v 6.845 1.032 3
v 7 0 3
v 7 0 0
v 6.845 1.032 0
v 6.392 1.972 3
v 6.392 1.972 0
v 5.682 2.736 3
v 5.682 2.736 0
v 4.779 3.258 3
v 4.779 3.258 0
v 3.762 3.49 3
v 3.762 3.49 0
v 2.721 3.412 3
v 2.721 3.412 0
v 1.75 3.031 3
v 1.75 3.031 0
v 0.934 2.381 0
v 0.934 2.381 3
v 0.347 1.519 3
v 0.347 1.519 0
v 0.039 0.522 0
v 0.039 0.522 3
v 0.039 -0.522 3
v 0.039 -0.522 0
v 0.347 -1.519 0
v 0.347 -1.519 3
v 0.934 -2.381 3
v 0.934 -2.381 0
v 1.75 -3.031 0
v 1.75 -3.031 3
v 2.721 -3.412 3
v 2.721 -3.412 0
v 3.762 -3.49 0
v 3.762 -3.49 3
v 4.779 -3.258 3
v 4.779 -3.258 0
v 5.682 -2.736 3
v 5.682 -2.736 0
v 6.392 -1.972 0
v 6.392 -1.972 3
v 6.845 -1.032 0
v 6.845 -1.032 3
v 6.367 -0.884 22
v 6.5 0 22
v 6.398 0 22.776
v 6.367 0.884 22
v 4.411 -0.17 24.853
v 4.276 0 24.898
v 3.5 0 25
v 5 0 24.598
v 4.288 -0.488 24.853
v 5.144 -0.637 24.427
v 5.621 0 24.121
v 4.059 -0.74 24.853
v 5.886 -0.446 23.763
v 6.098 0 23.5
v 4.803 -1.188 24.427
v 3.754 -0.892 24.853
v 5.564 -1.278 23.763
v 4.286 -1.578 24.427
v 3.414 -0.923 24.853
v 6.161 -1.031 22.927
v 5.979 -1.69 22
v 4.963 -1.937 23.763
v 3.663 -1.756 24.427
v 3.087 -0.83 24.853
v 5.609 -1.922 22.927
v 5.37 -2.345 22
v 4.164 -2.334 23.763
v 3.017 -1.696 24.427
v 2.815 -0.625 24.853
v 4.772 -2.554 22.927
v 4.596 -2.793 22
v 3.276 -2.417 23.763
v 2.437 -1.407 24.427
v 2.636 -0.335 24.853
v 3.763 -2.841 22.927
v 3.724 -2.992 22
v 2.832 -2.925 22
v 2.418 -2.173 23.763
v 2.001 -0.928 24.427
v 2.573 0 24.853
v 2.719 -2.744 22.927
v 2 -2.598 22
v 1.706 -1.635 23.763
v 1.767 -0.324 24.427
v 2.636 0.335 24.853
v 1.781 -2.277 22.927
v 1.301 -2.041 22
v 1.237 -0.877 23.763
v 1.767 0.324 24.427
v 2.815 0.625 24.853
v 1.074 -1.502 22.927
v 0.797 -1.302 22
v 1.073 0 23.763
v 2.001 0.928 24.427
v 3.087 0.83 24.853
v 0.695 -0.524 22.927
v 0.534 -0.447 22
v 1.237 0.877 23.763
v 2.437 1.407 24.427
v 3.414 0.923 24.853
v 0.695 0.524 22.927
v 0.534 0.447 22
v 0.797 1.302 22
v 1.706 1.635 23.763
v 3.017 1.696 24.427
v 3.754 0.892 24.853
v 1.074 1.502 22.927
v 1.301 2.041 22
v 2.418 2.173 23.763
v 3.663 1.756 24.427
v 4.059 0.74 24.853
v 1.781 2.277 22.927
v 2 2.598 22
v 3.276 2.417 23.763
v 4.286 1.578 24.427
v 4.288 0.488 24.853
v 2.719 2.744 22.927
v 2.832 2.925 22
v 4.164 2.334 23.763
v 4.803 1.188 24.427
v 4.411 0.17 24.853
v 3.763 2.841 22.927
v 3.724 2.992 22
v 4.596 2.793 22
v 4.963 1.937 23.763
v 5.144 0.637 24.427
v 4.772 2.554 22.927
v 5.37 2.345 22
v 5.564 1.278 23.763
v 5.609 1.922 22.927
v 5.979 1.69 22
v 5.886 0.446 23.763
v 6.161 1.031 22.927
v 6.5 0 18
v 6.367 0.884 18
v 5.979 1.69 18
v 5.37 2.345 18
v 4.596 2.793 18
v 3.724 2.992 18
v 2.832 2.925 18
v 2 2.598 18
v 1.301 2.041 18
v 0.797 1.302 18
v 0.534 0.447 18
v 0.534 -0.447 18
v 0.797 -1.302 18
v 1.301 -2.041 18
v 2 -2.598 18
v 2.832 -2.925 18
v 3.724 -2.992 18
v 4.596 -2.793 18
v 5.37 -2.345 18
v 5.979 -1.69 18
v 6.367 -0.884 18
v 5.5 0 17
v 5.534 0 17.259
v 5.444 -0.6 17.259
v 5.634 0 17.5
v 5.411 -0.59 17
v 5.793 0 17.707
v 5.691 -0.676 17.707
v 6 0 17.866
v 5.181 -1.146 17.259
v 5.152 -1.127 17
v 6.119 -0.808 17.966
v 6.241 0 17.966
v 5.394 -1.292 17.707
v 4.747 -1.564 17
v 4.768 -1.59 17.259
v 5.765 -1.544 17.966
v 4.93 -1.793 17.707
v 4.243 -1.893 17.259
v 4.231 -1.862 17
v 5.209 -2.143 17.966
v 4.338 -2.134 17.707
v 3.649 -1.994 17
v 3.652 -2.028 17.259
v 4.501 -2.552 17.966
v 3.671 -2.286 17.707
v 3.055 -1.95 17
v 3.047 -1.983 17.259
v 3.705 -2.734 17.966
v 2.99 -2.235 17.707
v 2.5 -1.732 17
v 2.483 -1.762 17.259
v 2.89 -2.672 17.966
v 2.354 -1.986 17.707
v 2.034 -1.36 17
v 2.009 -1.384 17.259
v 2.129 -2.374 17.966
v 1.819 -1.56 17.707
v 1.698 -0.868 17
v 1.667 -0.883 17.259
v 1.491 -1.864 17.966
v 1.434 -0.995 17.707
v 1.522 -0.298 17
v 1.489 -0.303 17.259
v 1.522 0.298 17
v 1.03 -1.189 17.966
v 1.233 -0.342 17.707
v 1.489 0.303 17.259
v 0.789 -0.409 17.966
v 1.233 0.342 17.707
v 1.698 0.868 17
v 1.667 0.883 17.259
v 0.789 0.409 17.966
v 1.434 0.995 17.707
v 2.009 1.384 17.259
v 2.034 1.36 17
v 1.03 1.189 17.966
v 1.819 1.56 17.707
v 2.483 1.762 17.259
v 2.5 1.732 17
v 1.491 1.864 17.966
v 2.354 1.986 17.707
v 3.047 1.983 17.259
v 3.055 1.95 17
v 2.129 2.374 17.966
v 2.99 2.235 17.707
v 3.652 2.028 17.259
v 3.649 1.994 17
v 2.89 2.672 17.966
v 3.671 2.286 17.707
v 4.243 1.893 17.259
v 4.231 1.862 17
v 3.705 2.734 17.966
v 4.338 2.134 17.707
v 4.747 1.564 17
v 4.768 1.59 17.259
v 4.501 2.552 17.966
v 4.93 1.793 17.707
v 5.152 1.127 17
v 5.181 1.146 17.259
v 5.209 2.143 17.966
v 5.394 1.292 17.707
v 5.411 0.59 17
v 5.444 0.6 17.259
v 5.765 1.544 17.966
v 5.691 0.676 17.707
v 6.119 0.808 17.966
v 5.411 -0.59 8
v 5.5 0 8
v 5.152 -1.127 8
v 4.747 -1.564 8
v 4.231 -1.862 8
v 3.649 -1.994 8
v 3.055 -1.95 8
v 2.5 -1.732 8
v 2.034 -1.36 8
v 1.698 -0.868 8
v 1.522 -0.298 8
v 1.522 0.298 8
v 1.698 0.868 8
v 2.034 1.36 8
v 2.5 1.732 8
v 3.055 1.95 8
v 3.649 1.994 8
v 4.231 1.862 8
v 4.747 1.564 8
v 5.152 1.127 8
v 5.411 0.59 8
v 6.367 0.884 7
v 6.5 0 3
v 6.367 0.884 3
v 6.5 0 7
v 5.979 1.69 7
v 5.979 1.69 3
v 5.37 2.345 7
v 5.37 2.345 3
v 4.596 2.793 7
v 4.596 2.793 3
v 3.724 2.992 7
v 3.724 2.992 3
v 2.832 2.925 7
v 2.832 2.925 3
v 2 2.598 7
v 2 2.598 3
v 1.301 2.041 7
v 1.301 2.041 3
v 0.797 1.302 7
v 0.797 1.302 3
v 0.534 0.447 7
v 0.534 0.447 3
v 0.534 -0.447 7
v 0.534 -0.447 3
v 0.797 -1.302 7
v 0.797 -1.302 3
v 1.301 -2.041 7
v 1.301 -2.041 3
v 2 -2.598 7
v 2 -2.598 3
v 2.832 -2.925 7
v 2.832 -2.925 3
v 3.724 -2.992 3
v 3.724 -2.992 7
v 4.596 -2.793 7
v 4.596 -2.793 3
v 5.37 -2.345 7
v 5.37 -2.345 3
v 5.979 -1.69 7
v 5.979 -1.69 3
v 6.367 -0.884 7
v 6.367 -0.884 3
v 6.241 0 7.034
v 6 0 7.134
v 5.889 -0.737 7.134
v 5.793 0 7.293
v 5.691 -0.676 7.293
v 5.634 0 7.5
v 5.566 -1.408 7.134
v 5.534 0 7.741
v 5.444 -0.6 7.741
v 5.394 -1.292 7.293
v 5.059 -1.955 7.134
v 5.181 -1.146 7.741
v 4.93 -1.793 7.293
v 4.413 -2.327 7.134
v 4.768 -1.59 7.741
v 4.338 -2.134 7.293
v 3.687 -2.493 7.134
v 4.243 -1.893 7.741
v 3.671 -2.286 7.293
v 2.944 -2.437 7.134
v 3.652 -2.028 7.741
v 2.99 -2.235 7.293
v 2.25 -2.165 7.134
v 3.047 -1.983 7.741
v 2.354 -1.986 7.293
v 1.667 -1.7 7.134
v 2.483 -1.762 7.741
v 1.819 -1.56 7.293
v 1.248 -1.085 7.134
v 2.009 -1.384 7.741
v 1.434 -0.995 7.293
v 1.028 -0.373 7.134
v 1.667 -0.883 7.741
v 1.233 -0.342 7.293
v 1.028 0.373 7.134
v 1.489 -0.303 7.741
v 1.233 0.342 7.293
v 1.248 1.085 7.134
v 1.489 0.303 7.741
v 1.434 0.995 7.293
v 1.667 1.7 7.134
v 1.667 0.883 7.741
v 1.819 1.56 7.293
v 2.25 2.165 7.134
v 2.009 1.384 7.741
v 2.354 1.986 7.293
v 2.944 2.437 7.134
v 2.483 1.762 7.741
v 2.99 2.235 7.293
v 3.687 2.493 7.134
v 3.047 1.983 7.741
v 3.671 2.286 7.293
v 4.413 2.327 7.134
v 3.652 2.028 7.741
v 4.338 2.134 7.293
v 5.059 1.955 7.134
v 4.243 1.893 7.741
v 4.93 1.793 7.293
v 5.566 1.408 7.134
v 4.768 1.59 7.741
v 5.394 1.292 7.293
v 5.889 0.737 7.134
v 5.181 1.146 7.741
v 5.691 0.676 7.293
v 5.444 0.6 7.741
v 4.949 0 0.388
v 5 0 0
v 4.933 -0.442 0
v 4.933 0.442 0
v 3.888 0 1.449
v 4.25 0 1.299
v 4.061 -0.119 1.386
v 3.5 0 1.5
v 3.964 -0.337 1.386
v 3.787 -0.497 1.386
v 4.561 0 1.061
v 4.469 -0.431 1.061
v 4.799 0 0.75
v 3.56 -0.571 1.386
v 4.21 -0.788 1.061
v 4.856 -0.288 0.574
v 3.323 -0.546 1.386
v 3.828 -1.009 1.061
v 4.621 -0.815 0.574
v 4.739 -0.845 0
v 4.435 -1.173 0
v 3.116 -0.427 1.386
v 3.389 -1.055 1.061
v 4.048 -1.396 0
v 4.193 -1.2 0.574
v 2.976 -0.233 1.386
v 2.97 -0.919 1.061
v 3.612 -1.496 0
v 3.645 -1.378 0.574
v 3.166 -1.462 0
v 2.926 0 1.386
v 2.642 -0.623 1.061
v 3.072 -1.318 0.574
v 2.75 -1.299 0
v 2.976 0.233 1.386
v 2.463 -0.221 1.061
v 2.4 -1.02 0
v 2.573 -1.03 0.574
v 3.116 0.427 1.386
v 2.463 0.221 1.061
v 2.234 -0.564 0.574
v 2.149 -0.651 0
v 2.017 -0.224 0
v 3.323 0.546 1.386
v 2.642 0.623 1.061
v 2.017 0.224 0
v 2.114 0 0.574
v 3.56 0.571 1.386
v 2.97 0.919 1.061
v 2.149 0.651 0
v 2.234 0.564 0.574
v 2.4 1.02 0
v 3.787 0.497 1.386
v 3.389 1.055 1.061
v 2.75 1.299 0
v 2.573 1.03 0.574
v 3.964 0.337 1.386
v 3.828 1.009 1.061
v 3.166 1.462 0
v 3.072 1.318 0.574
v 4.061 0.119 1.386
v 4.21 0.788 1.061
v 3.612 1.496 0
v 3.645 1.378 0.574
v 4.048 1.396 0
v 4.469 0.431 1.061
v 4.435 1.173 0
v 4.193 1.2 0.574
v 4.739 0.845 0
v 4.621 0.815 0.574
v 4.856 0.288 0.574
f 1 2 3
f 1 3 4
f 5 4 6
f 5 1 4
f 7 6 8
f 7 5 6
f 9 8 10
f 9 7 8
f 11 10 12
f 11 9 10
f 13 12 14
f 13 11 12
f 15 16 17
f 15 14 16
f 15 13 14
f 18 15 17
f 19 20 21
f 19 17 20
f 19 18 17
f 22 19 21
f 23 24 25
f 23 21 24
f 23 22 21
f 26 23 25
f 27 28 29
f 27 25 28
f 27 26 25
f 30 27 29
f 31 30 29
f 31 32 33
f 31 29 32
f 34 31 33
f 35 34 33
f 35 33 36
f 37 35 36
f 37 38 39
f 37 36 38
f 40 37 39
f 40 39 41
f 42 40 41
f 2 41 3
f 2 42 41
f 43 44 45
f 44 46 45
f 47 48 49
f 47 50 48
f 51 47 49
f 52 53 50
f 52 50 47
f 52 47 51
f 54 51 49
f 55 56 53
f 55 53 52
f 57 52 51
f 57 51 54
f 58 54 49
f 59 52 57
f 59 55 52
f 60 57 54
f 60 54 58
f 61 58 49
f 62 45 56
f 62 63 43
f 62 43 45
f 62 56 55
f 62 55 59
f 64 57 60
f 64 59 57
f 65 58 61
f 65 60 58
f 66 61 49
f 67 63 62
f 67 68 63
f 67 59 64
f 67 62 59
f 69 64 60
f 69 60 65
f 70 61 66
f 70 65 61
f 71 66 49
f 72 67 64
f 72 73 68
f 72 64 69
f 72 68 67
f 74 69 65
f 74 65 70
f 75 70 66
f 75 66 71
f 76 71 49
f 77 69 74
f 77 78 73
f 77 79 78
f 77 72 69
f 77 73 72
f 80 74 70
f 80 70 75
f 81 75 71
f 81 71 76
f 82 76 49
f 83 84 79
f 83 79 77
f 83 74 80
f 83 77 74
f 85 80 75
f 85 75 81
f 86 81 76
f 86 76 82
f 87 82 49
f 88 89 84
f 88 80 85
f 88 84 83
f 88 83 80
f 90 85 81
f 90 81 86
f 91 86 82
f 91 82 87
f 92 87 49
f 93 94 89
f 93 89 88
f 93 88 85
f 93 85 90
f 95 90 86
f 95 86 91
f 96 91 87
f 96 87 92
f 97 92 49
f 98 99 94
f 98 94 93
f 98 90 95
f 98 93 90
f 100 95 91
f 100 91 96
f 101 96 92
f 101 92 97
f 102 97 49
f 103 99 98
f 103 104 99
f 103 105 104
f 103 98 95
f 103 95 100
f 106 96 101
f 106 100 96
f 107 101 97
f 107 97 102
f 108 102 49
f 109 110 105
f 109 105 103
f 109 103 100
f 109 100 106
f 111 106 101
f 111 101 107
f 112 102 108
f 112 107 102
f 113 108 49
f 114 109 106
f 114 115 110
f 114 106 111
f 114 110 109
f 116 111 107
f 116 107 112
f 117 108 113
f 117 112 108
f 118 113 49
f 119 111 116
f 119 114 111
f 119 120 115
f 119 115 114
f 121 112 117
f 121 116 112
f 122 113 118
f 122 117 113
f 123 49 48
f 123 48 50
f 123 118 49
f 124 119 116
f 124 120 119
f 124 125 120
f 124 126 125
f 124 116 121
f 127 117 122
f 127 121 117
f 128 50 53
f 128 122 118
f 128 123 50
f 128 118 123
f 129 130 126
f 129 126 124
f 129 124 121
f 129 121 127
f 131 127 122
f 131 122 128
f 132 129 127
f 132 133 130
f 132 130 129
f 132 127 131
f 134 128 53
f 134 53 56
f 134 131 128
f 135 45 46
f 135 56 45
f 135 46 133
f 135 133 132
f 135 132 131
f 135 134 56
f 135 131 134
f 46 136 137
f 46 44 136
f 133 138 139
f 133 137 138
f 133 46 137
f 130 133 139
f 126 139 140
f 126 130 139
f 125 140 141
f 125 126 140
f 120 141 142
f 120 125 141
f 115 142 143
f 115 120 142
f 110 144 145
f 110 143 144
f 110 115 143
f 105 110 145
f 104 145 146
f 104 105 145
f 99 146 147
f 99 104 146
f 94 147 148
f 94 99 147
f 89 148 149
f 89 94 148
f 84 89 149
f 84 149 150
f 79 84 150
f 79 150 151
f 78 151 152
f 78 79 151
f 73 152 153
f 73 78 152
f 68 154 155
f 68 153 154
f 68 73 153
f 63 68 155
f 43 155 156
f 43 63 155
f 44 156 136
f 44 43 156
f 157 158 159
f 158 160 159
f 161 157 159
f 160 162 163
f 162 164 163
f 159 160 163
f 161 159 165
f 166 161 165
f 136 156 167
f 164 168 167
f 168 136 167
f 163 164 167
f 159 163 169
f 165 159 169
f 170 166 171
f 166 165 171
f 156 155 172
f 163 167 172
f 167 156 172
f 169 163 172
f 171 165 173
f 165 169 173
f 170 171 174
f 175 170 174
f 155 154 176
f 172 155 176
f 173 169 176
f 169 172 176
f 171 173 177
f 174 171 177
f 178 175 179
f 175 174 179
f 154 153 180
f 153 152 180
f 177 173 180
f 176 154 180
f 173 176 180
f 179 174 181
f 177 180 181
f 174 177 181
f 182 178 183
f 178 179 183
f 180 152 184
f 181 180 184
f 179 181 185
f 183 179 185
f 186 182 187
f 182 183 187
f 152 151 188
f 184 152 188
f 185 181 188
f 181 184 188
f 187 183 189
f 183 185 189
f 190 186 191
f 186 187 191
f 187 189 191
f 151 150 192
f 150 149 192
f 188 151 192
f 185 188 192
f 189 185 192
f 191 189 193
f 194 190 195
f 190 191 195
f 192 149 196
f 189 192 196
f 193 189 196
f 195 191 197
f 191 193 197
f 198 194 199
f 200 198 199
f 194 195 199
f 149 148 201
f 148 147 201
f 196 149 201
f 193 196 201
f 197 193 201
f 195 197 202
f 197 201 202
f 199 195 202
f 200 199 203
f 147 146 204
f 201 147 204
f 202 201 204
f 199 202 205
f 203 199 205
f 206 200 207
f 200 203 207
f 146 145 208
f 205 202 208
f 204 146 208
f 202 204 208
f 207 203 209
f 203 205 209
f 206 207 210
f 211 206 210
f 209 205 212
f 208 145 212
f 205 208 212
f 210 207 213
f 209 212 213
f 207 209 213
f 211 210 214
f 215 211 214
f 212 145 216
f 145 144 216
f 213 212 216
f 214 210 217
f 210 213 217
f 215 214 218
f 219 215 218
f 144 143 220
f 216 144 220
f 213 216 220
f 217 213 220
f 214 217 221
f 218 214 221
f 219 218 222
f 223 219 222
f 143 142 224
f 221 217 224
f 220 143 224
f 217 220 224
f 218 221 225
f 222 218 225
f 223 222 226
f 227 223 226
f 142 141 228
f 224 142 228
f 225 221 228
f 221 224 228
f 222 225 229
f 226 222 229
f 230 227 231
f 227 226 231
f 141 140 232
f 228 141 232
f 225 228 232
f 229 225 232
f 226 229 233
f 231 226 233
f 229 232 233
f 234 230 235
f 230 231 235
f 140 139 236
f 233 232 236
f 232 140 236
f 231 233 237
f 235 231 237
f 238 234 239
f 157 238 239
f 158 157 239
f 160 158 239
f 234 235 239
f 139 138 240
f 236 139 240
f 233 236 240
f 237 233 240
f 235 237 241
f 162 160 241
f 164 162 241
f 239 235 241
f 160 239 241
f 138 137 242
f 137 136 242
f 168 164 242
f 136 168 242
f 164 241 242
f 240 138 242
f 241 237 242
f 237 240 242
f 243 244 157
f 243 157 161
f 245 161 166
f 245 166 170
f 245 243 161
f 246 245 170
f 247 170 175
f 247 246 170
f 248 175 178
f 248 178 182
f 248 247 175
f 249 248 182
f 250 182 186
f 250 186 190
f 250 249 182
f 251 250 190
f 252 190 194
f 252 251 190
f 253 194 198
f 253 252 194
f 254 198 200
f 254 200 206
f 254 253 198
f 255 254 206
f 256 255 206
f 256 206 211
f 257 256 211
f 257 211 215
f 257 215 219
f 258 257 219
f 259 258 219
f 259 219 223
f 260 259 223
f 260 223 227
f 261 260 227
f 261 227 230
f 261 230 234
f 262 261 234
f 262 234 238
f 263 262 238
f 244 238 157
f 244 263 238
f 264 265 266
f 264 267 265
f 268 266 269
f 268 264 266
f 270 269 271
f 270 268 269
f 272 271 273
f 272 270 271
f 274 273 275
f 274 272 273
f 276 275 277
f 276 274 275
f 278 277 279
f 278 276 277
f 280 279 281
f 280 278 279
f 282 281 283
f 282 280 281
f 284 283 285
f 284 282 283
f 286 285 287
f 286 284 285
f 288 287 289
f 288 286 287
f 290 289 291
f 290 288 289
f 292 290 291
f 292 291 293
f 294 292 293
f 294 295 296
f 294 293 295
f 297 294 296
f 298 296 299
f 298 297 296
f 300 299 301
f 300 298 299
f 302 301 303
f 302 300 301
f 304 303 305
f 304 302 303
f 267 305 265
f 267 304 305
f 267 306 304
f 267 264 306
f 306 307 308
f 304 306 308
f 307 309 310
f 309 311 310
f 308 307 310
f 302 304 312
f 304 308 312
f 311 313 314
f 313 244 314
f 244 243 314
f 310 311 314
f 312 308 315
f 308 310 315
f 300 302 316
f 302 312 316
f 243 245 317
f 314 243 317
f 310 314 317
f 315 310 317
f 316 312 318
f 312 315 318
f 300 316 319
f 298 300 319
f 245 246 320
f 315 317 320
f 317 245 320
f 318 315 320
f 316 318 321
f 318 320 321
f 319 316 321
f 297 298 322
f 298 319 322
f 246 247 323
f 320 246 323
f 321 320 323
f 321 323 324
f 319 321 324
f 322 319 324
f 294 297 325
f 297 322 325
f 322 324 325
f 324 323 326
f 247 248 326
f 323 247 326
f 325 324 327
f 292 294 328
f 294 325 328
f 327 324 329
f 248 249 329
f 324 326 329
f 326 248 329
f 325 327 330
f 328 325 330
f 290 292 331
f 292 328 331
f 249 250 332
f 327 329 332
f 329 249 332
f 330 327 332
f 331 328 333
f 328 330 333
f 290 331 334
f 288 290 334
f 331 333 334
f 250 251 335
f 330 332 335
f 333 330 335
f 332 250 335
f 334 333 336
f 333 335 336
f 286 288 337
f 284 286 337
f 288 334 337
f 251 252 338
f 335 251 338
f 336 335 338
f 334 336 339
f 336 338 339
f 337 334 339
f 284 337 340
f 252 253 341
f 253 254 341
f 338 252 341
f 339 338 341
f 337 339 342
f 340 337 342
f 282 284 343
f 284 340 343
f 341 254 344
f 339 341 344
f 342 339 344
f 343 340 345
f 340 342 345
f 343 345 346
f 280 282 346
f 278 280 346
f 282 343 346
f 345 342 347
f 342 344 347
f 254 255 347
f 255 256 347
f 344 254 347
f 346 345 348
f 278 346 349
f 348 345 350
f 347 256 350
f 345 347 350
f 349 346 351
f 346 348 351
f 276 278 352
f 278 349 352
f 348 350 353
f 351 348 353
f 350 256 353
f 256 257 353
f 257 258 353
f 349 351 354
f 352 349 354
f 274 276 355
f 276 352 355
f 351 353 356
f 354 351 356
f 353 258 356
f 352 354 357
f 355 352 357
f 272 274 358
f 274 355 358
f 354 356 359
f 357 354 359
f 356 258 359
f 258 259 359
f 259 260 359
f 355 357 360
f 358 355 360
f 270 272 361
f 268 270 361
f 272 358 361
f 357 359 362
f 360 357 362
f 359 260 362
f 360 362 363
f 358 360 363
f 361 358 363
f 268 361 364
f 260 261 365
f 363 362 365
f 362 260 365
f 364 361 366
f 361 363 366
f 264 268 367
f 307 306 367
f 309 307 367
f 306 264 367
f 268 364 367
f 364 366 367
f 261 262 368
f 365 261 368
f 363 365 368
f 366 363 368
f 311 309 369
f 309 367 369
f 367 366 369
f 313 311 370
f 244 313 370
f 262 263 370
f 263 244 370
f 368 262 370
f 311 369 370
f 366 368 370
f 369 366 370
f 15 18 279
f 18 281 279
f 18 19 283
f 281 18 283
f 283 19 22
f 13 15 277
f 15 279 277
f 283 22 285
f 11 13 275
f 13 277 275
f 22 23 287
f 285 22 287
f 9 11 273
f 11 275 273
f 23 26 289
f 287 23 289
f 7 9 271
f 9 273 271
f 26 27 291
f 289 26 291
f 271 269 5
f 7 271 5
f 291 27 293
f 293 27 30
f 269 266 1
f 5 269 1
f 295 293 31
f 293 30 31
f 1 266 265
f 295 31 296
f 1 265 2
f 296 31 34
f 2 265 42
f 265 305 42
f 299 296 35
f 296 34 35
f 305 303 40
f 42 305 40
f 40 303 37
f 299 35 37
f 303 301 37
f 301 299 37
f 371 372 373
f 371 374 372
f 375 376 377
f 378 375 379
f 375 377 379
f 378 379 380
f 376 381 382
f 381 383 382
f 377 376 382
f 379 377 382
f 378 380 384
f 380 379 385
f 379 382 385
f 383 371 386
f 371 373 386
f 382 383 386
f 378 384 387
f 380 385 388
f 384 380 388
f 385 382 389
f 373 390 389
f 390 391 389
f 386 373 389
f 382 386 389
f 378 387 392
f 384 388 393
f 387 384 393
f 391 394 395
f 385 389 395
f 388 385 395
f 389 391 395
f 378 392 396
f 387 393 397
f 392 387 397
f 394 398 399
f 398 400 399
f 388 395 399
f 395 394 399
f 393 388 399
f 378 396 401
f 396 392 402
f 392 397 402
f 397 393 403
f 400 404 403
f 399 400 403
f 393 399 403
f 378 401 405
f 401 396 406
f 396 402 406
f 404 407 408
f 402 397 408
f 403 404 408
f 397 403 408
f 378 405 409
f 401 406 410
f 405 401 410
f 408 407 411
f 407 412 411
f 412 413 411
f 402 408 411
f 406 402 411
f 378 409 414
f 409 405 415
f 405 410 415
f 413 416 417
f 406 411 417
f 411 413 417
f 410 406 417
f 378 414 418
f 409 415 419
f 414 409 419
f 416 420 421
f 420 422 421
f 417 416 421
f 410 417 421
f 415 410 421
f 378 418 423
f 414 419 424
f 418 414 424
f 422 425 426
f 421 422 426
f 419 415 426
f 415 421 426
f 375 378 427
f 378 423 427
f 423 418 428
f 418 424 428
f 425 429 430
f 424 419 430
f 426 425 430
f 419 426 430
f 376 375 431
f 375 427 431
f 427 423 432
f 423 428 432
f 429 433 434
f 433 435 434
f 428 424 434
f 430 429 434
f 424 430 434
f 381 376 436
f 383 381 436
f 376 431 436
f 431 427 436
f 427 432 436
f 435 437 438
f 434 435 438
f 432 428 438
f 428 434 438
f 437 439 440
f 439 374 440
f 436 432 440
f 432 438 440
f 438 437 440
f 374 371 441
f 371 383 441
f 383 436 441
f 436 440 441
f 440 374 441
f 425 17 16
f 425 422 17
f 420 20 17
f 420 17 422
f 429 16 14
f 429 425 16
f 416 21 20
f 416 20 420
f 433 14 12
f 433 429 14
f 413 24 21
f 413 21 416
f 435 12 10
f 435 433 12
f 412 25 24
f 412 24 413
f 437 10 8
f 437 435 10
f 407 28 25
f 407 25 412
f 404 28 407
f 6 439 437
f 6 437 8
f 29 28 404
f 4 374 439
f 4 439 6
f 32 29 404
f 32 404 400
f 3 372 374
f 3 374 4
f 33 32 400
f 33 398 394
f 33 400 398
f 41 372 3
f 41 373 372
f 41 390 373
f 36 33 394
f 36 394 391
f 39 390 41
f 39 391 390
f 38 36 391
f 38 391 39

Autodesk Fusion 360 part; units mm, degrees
sketch "Sketch1" plane through (0, 0, 0) normal (0, 1, 0) x (1, 0, 0)
  line L0 (5, 0) -> (7, 0)
  line L1 (7, 0) -> (7, -3)
  line L2 (6.5, -3) -> (6.5, -7)
  line L3 (5.5, -17) -> (5.5, -8)
  line L4 (6.5, -18) -> (6.5, -22)
  arc A0 (3.5, -25) -> (6.5, -22) centre (3.5, -22) ccw
  line L5 (0.5, -18) -> (0.5, -18)
  line L6 (6.5, -18) -> (6.5, -18)
  line L7 (6.5, -7) -> (6.5, -7)
  line L8 (0.5, -7) -> (0.5, -7)
  arc A1 (5.5, -17) -> (6.5, -18) centre (6.5, -17) ccw
  arc A2 (6.5, -7) -> (5.5, -8) centre (6.5, -8) ccw
  line L9 (7, -3) -> (6.5, -3)
  line L10 (0.5, -3) -> (0, -3)
  line L11 (3.5, 0) -> (3.5, -25) construction
  line L12 (3.5, -25) -> (3.5, -1.5)
  arc A3 (3.5, -1.5) -> (5, 0) centre (3.5, 0) ccw
  point P0 (5.5, -7)
  point P1 (1.5, -7)
  point P2 (5.5, -18)
  dimension "d10" = 7
  dimension "d11" = 3
  dimension "d12" = 6
  dimension "d13" = 4
  dimension "d14" = 4
  dimension "d15" = 11
  dimension "d16" = 6
  dimension "d17" = 6
  dimension "d18" = 4
  dimension "d20" = 1
  dimension "d22" = 1
  dimension "d25" = 3
revolve "Revolve1" add sketch "Sketch1" angle 360 about axis through (3.5, 0, 25) along (0, 0, -1)
equation "lifter_tier_one_height = 3 mm"
equation "lifter_tier_one_diameter = 7 mm"
equation "lifter_tier_two_height = 4 mm"
equation "lifter_tier_two_diameter = 6 mm"
equation "lifter_tier_three_height = 11 mm"
equation "lifter_tier_three_diameter = 4 mm"
equation "lifter_tier_three_radius = 1 mm"
equation "lifter_tier_four_diameter = 6 mm"
equation "lifter_tier_four_total_height = 7 mm"
equation "d10 = lifter_tier_one_diameter"
equation "d11 = lifter_tier_one_height"
equation "d12 = lifter_tier_two_diameter"
equation "d13 = lifter_tier_two_height"
equation "d14 = lifter_tier_three_diameter"
equation "d15 = lifter_tier_three_height"
equation "d16 = lifter_tier_four_diameter"
equation "d17 = lifter_tier_four_diameter"
equation "d18 = lifter_tier_four_total_height - ( lifter_tier_four_diameter / 2 )"
equation "d20 = lifter_tier_three_radius"
equation "d22 = lifter_tier_three_radius"
equation "hemispherical_cut_diameter = 3 mm"
equation "d25 = hemispherical_cut_diameter"
